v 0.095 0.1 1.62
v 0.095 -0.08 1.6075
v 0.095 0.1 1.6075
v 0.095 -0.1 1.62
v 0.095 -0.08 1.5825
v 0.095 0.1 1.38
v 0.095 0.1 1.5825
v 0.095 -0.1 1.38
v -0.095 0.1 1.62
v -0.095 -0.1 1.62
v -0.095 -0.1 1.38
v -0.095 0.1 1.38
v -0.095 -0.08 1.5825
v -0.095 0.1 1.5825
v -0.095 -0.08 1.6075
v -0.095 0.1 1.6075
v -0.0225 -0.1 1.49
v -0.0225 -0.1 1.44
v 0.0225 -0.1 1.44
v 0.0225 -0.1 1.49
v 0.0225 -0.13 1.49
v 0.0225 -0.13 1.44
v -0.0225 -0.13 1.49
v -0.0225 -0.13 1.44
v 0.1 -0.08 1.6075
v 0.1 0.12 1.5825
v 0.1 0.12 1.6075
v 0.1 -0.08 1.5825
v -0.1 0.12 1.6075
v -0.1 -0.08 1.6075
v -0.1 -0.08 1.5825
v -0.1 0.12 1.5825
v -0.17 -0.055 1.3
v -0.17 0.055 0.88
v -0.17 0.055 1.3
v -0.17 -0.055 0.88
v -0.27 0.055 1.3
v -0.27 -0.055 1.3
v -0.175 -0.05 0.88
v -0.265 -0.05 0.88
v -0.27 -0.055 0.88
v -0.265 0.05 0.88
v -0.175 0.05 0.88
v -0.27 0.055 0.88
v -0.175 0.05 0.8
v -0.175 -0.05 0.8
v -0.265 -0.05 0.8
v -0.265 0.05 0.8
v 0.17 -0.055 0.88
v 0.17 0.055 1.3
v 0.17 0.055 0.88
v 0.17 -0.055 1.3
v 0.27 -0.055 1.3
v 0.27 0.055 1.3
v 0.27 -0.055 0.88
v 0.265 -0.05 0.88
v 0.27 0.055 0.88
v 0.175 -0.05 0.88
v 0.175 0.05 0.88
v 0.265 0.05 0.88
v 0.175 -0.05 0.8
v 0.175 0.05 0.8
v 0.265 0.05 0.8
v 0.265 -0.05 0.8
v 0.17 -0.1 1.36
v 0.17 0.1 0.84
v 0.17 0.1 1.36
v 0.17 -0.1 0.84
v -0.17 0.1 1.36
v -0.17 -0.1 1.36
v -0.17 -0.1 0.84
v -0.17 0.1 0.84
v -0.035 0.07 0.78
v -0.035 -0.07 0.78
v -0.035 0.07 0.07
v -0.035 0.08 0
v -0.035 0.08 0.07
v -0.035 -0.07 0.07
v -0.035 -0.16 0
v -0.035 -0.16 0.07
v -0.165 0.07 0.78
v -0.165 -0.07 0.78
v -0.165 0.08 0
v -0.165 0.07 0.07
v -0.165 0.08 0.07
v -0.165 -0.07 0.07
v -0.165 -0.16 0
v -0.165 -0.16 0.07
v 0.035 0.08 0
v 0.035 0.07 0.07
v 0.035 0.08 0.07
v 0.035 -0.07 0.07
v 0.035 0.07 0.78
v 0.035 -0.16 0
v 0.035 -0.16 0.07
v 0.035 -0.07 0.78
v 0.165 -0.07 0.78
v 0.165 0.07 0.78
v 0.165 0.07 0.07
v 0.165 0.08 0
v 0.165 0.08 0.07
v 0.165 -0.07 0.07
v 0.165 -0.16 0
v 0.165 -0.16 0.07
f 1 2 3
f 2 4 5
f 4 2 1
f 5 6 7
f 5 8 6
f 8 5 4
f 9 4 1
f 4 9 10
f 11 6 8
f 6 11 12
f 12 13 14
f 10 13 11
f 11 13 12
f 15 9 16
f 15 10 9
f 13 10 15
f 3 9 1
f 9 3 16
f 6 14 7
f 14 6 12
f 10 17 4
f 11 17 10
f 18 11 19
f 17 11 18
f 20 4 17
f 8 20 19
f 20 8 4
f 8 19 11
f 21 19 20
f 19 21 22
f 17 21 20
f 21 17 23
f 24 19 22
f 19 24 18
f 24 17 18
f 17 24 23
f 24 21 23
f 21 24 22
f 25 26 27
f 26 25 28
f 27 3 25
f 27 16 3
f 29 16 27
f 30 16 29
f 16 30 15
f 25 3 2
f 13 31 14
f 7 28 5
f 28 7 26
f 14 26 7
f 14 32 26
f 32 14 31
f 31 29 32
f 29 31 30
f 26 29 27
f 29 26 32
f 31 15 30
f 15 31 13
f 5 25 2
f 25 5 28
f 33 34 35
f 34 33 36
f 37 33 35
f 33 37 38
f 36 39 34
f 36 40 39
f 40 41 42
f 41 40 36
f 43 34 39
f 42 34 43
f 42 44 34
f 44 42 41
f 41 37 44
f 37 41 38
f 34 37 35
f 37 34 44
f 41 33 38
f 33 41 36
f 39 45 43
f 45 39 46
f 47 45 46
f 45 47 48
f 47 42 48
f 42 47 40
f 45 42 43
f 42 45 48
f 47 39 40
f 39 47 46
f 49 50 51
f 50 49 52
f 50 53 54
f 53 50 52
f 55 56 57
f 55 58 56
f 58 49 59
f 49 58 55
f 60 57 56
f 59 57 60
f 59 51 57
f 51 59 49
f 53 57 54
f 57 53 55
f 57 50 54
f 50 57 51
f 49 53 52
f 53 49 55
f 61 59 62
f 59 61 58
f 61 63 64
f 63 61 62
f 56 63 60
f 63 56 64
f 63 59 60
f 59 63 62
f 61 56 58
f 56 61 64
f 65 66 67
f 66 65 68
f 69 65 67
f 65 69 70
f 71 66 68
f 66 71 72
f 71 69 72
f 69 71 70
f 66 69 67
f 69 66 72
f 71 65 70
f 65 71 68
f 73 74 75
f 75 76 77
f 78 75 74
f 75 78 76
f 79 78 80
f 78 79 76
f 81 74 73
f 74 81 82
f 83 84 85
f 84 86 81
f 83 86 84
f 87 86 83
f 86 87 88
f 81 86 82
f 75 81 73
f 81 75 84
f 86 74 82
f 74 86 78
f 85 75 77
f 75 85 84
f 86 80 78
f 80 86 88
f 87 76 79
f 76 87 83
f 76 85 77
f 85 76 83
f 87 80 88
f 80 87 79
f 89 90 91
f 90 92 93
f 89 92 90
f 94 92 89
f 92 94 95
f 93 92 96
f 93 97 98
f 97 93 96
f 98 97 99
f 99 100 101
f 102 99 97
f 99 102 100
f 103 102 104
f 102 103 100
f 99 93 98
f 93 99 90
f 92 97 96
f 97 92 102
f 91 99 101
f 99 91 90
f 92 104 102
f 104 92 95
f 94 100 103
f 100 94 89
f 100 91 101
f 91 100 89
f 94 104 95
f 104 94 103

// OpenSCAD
// file: ../lib/kit_tw.scad
// kit_tw.scad — NextTotalwar 低模战场与角色零件库。
// 纯零件库；落地件底面 z=0，带朝向件 front=-y。

use <kit_char.scad>

function tw_WOOD() = [0.30, 0.20, 0.12];
function tw_WOOD_DARK() = [0.18, 0.11, 0.07];
function tw_STONE() = [0.34, 0.34, 0.31];
function tw_METAL() = [0.20, 0.22, 0.23];
function tw_LEATHER() = [0.28, 0.16, 0.09];
function tw_CLOTH() = ch_TINT();
function tw_sq(x) = (x * x + x * 613 + 47) % 65521;
function tw_rnd(s, m) = tw_sq(tw_sq(((s % 65521) + 65521) % 65521) + 17) % m;

module tw_boxc(s) cube(s, center=true);
module tw_slab(L=4, D=4, t=0.2) translate([0, 0, t/2]) tw_boxc([L, D, t]);

module tw_bldg_palisade(L=8, H=2.7, seed=0)
{
    n = max(3, floor(L / 0.42));
    for (i=[0:n-1])
        color(i % 3 == 0 ? tw_WOOD_DARK() : tw_WOOD())
            translate([-L/2 + (i+0.5)*L/n, 0, H/2])
                cylinder(h=H, r=0.22, $fn=6, center=true);
    color(tw_WOOD_DARK()) for (z=[0.75, 1.8])
        translate([0, 0.12, z]) tw_boxc([L+0.15, 0.16, 0.14]);
}

module tw_bldg_watchtower(seed=0)
{
    H = 6.0;
    for (sx=[-1,1], sy=[-1,1])
        color(tw_WOOD_DARK())
            translate([sx*1.05, sy*1.05, H/2])
                rotate([sy*5, sx*-5, 0]) tw_boxc([0.20, 0.20, H]);
    color(tw_WOOD()) translate([0, 0, H]) tw_slab(3.4, 3.4, 0.22);
    color(tw_WOOD()) translate([0, 0, H+0.22]) tw_slab(2.5, 2.5, 1.25);
    color([0.22, 0.13, 0.08]) translate([0, 0, H+1.47])
        cylinder(h=1.15, r1=2.0, r2=0.15, $fn=4);
    color(tw_WOOD()) for (i=[0:7])
        translate([0, -1.28, 0.45+i*0.65]) tw_boxc([0.75, 0.08, 0.07]);
}

module tw_bldg_gatehouse(W=6, seed=0)
{
    color(tw_STONE()) for (sx=[-1,1])
        translate([sx*(W/2+1.0), 0, 1.8]) tw_boxc([1.8, 2.4, 3.6]);
    color(tw_WOOD()) translate([0, 0, 3.1]) tw_boxc([W, 1.1, 0.55]);
    color(tw_WOOD_DARK()) for (x=[-W/2+0.3:0.55:W/2-0.3])
        translate([x, 0, 1.35]) tw_boxc([0.16, 0.28, 2.7]);
}

module tw_bldg_hut(seed=0)
{
    color(tw_WOOD()) tw_slab(4.8, 3.8, 2.2);
    color([0.25, 0.15, 0.09]) translate([0, 0, 2.2])
        rotate([0, 0, 45]) cylinder(h=1.6, r1=3.25, r2=0.15, $fn=4);
    color([0.08, 0.07, 0.06]) translate([0, -1.94, 1.0]) tw_boxc([0.85, 0.08, 1.7]);
}

module tw_prop_banner(seed=0, tint=ch_TINT())
{
    color(tw_WOOD_DARK()) translate([0, 0, 1.9]) cylinder(h=3.8, r=0.055, $fn=6, center=true);
    color(tint) translate([0.58, 0, 3.05]) tw_boxc([1.15, 0.035, 0.85]);
    color(tw_METAL()) translate([0, 0, 3.86]) sphere(r=0.11, $fn=6);
}

module tw_prop_stakes(seed=0)
{
    for (i=[-1,0,1])
        color(tw_WOOD_DARK()) translate([i*1.1, 0, 0.88])
            rotate([45, 0, 0]) tw_boxc([0.13, 2.3, 0.13]);
    color(tw_WOOD()) translate([0, 0, 0.65]) tw_boxc([3.3, 0.15, 0.15]);
}

module tw_prop_cart(seed=0)
{
    color(tw_WOOD()) translate([0, 0, 0.75]) tw_boxc([2.2, 1.25, 0.18]);
    color(tw_WOOD_DARK()) for (sy=[-1,1])
        translate([-0.65, sy*0.72, 0.52]) rotate([90, 0, 0])
            cylinder(h=0.14, r=0.52, $fn=10, center=true);
    color(tw_WOOD_DARK()) for (sy=[-1,1])
        translate([1.65, sy*0.38, 1.10]) rotate([0, 75, 0]) tw_boxc([2.2, 0.10, 0.10]);
}

module tw_prop_haystack(seed=0)
{
    color([0.54, 0.38, 0.12]) cylinder(h=1.35, r1=1.25, r2=0.68, $fn=8);
    color([0.64, 0.48, 0.16]) translate([0, 0, 1.35])
        cylinder(h=0.65, r1=0.68, r2=0.08, $fn=8);
}

module tw_prop_marker(seed=0)
{
    color(ch_TINT()) tw_slab(1.6, 1.6, 0.045);
    color([0.85, 0.72, 0.22]) translate([0, 0, 0.05])
        cylinder(h=0.035, r=0.48, $fn=16);
}

module tw_head_soldier(style=0)
{
    ch_head_box(ch_SKIN(style % 3));
    color(style == 2 ? tw_LEATHER() : tw_METAL())
        translate([0, 0, 0.27]) cylinder(h=0.15, r1=0.20, r2=0.14, $fn=8);
}

module tw_torso_soldier(style=0, tint=ch_TINT())
{
    color(tint) translate([0, 0, -0.06]) tw_boxc([0.43, 0.25, 0.60]);
    color(style == 1 ? tw_METAL() : tw_LEATHER())
        translate([0, 0.07, -0.05]) tw_boxc([0.34, 0.08, 0.48]);
}

module tw_arm_soldier(style=0, tint=ch_TINT(), weapon=0)
{
    ch_arm_long(tint);
    if (weapon == 1)
        color(tw_WOOD_DARK()) translate([0, -0.07, -0.55]) cylinder(h=2.2, r=0.035, $fn=6);
    if (weapon == 2)
        color(tw_METAL()) translate([0, -0.10, -0.42]) rotate([8, 0, 0])
            tw_boxc([0.07, 0.06, 0.92]);
    if (weapon == 3)
        color(tw_WOOD()) translate([0, -0.08, -0.38])
            rotate([0, 90, 0]) cylinder(h=0.48, r=0.30, $fn=12, center=true);
}

module tw_leg_soldier(style=0) { ch_leg_boots([0.25, 0.22, 0.18], tw_LEATHER()); }

// Looping melee clips share the standard seven-bone soldier skeleton.
function tw_clip_attack_thrust() = [
    ["bone_arm_r", "rot", [[0.00, [-72, 0, -6]], [0.28, [-108, 0, -3]],
                            [0.48, [-108, 0, -3]], [0.90, [-72, 0, -6]]]],
    ["bone_arm_l", "rot", [[0.00, [-48, 0, 12]], [0.28, [-66, 0, 7]],
                            [0.48, [-66, 0, 7]], [0.90, [-48, 0, 12]]]],
    ["bone_torso", "rot", [[0.00, [2, 0, 0]], [0.28, [-10, 0, 0]],
                            [0.48, [-10, 0, 0]], [0.90, [2, 0, 0]]]],
];

function tw_clip_attack_slash() = [
    ["bone_arm_r", "rot", [[0.00, [-48, 0, -48]], [0.25, [-132, 0, 34]],
                            [0.52, [-82, 0, 58]], [0.95, [-48, 0, -48]]]],
    ["bone_arm_l", "rot", [[0.00, [-24, 0, 18]], [0.52, [-52, 0, -12]],
                            [0.95, [-24, 0, 18]]]],
    ["bone_torso", "rot", [[0.00, [0, 0, -8]], [0.25, [3, 0, 10]],
                            [0.52, [6, 0, 16]], [0.95, [0, 0, -8]]]],
];

function tw_clip_die_fall() = [
    ["loop", false],
    ["bone_root", "rot", [[0.00, [0, 0, 0]], [0.18, [-8, 0, 0]],
                           [0.55, [-58, 0, 0]], [0.80, [-85, 0, 0]]]],
    ["bone_root", "pos", [[0.00, [0, 0, 0]], [0.55, [0, 0, -0.03]],
                           [0.80, [0, 0, -0.08]]]],
    ["bone_arm_l", "rot", [[0.00, [0, 0, 0]], [0.80, [-28, 0, -62]]]],
    ["bone_arm_r", "rot", [[0.00, [0, 0, 0]], [0.80, [-18, 0, 68]]]],
    ["bone_leg_l", "rot", [[0.00, [0, 0, 0]], [0.80, [18, 0, -22]]]],
    ["bone_leg_r", "rot", [[0.00, [0, 0, 0]], [0.80, [-12, 0, 26]]]],
];
// main file
// NextDayz infected ScadRig: fixed seven-bone human skeleton, shared meshes,
// and the six clips required by the productized PVE loop.
use <../lib/kit_char.scad>
use <../lib/kit_tw.scad>

$fn = 8;

module bone_head()
{
    ch_head_slim([0.46, 0.52, 0.40]);
    color([0.18, 0.12, 0.08]) translate([0, 0.02, 0.215]) cube([0.20, 0.20, 0.025], center = true);
}

module bone_arm_l() { ch_arm_long(ch_TINT(), [0.46, 0.52, 0.40]); }
module bone_arm_r() { mirror([1, 0, 0]) ch_arm_long(ch_TINT(), [0.46, 0.52, 0.40]); }
module bone_leg_l() { ch_leg_pants([0.18, 0.21, 0.20]); }
module bone_leg_r() { mirror([1, 0, 0]) ch_leg_pants([0.18, 0.21, 0.20]); }

module bone_torso()
{
    ch_torso_shirt(ch_TINT());
    translate(ch_pivot_head()) bone_head();
    translate(ch_pivot_arm_l()) bone_arm_l();
    translate(ch_pivot_arm_r()) bone_arm_r();
}

module bone_root()
{
    translate(ch_pivot_torso()) bone_torso();
    translate(ch_pivot_leg_l()) bone_leg_l();
    translate(ch_pivot_leg_r()) bone_leg_r();
}

bone_root();

anim_idle = ch_clip_idle();
anim_walk = ch_clip_walk();
anim_run = ch_clip_walk();
anim_attack = tw_clip_attack_slash();
anim_hit = tw_clip_attack_thrust();
anim_die = tw_clip_die_fall();
